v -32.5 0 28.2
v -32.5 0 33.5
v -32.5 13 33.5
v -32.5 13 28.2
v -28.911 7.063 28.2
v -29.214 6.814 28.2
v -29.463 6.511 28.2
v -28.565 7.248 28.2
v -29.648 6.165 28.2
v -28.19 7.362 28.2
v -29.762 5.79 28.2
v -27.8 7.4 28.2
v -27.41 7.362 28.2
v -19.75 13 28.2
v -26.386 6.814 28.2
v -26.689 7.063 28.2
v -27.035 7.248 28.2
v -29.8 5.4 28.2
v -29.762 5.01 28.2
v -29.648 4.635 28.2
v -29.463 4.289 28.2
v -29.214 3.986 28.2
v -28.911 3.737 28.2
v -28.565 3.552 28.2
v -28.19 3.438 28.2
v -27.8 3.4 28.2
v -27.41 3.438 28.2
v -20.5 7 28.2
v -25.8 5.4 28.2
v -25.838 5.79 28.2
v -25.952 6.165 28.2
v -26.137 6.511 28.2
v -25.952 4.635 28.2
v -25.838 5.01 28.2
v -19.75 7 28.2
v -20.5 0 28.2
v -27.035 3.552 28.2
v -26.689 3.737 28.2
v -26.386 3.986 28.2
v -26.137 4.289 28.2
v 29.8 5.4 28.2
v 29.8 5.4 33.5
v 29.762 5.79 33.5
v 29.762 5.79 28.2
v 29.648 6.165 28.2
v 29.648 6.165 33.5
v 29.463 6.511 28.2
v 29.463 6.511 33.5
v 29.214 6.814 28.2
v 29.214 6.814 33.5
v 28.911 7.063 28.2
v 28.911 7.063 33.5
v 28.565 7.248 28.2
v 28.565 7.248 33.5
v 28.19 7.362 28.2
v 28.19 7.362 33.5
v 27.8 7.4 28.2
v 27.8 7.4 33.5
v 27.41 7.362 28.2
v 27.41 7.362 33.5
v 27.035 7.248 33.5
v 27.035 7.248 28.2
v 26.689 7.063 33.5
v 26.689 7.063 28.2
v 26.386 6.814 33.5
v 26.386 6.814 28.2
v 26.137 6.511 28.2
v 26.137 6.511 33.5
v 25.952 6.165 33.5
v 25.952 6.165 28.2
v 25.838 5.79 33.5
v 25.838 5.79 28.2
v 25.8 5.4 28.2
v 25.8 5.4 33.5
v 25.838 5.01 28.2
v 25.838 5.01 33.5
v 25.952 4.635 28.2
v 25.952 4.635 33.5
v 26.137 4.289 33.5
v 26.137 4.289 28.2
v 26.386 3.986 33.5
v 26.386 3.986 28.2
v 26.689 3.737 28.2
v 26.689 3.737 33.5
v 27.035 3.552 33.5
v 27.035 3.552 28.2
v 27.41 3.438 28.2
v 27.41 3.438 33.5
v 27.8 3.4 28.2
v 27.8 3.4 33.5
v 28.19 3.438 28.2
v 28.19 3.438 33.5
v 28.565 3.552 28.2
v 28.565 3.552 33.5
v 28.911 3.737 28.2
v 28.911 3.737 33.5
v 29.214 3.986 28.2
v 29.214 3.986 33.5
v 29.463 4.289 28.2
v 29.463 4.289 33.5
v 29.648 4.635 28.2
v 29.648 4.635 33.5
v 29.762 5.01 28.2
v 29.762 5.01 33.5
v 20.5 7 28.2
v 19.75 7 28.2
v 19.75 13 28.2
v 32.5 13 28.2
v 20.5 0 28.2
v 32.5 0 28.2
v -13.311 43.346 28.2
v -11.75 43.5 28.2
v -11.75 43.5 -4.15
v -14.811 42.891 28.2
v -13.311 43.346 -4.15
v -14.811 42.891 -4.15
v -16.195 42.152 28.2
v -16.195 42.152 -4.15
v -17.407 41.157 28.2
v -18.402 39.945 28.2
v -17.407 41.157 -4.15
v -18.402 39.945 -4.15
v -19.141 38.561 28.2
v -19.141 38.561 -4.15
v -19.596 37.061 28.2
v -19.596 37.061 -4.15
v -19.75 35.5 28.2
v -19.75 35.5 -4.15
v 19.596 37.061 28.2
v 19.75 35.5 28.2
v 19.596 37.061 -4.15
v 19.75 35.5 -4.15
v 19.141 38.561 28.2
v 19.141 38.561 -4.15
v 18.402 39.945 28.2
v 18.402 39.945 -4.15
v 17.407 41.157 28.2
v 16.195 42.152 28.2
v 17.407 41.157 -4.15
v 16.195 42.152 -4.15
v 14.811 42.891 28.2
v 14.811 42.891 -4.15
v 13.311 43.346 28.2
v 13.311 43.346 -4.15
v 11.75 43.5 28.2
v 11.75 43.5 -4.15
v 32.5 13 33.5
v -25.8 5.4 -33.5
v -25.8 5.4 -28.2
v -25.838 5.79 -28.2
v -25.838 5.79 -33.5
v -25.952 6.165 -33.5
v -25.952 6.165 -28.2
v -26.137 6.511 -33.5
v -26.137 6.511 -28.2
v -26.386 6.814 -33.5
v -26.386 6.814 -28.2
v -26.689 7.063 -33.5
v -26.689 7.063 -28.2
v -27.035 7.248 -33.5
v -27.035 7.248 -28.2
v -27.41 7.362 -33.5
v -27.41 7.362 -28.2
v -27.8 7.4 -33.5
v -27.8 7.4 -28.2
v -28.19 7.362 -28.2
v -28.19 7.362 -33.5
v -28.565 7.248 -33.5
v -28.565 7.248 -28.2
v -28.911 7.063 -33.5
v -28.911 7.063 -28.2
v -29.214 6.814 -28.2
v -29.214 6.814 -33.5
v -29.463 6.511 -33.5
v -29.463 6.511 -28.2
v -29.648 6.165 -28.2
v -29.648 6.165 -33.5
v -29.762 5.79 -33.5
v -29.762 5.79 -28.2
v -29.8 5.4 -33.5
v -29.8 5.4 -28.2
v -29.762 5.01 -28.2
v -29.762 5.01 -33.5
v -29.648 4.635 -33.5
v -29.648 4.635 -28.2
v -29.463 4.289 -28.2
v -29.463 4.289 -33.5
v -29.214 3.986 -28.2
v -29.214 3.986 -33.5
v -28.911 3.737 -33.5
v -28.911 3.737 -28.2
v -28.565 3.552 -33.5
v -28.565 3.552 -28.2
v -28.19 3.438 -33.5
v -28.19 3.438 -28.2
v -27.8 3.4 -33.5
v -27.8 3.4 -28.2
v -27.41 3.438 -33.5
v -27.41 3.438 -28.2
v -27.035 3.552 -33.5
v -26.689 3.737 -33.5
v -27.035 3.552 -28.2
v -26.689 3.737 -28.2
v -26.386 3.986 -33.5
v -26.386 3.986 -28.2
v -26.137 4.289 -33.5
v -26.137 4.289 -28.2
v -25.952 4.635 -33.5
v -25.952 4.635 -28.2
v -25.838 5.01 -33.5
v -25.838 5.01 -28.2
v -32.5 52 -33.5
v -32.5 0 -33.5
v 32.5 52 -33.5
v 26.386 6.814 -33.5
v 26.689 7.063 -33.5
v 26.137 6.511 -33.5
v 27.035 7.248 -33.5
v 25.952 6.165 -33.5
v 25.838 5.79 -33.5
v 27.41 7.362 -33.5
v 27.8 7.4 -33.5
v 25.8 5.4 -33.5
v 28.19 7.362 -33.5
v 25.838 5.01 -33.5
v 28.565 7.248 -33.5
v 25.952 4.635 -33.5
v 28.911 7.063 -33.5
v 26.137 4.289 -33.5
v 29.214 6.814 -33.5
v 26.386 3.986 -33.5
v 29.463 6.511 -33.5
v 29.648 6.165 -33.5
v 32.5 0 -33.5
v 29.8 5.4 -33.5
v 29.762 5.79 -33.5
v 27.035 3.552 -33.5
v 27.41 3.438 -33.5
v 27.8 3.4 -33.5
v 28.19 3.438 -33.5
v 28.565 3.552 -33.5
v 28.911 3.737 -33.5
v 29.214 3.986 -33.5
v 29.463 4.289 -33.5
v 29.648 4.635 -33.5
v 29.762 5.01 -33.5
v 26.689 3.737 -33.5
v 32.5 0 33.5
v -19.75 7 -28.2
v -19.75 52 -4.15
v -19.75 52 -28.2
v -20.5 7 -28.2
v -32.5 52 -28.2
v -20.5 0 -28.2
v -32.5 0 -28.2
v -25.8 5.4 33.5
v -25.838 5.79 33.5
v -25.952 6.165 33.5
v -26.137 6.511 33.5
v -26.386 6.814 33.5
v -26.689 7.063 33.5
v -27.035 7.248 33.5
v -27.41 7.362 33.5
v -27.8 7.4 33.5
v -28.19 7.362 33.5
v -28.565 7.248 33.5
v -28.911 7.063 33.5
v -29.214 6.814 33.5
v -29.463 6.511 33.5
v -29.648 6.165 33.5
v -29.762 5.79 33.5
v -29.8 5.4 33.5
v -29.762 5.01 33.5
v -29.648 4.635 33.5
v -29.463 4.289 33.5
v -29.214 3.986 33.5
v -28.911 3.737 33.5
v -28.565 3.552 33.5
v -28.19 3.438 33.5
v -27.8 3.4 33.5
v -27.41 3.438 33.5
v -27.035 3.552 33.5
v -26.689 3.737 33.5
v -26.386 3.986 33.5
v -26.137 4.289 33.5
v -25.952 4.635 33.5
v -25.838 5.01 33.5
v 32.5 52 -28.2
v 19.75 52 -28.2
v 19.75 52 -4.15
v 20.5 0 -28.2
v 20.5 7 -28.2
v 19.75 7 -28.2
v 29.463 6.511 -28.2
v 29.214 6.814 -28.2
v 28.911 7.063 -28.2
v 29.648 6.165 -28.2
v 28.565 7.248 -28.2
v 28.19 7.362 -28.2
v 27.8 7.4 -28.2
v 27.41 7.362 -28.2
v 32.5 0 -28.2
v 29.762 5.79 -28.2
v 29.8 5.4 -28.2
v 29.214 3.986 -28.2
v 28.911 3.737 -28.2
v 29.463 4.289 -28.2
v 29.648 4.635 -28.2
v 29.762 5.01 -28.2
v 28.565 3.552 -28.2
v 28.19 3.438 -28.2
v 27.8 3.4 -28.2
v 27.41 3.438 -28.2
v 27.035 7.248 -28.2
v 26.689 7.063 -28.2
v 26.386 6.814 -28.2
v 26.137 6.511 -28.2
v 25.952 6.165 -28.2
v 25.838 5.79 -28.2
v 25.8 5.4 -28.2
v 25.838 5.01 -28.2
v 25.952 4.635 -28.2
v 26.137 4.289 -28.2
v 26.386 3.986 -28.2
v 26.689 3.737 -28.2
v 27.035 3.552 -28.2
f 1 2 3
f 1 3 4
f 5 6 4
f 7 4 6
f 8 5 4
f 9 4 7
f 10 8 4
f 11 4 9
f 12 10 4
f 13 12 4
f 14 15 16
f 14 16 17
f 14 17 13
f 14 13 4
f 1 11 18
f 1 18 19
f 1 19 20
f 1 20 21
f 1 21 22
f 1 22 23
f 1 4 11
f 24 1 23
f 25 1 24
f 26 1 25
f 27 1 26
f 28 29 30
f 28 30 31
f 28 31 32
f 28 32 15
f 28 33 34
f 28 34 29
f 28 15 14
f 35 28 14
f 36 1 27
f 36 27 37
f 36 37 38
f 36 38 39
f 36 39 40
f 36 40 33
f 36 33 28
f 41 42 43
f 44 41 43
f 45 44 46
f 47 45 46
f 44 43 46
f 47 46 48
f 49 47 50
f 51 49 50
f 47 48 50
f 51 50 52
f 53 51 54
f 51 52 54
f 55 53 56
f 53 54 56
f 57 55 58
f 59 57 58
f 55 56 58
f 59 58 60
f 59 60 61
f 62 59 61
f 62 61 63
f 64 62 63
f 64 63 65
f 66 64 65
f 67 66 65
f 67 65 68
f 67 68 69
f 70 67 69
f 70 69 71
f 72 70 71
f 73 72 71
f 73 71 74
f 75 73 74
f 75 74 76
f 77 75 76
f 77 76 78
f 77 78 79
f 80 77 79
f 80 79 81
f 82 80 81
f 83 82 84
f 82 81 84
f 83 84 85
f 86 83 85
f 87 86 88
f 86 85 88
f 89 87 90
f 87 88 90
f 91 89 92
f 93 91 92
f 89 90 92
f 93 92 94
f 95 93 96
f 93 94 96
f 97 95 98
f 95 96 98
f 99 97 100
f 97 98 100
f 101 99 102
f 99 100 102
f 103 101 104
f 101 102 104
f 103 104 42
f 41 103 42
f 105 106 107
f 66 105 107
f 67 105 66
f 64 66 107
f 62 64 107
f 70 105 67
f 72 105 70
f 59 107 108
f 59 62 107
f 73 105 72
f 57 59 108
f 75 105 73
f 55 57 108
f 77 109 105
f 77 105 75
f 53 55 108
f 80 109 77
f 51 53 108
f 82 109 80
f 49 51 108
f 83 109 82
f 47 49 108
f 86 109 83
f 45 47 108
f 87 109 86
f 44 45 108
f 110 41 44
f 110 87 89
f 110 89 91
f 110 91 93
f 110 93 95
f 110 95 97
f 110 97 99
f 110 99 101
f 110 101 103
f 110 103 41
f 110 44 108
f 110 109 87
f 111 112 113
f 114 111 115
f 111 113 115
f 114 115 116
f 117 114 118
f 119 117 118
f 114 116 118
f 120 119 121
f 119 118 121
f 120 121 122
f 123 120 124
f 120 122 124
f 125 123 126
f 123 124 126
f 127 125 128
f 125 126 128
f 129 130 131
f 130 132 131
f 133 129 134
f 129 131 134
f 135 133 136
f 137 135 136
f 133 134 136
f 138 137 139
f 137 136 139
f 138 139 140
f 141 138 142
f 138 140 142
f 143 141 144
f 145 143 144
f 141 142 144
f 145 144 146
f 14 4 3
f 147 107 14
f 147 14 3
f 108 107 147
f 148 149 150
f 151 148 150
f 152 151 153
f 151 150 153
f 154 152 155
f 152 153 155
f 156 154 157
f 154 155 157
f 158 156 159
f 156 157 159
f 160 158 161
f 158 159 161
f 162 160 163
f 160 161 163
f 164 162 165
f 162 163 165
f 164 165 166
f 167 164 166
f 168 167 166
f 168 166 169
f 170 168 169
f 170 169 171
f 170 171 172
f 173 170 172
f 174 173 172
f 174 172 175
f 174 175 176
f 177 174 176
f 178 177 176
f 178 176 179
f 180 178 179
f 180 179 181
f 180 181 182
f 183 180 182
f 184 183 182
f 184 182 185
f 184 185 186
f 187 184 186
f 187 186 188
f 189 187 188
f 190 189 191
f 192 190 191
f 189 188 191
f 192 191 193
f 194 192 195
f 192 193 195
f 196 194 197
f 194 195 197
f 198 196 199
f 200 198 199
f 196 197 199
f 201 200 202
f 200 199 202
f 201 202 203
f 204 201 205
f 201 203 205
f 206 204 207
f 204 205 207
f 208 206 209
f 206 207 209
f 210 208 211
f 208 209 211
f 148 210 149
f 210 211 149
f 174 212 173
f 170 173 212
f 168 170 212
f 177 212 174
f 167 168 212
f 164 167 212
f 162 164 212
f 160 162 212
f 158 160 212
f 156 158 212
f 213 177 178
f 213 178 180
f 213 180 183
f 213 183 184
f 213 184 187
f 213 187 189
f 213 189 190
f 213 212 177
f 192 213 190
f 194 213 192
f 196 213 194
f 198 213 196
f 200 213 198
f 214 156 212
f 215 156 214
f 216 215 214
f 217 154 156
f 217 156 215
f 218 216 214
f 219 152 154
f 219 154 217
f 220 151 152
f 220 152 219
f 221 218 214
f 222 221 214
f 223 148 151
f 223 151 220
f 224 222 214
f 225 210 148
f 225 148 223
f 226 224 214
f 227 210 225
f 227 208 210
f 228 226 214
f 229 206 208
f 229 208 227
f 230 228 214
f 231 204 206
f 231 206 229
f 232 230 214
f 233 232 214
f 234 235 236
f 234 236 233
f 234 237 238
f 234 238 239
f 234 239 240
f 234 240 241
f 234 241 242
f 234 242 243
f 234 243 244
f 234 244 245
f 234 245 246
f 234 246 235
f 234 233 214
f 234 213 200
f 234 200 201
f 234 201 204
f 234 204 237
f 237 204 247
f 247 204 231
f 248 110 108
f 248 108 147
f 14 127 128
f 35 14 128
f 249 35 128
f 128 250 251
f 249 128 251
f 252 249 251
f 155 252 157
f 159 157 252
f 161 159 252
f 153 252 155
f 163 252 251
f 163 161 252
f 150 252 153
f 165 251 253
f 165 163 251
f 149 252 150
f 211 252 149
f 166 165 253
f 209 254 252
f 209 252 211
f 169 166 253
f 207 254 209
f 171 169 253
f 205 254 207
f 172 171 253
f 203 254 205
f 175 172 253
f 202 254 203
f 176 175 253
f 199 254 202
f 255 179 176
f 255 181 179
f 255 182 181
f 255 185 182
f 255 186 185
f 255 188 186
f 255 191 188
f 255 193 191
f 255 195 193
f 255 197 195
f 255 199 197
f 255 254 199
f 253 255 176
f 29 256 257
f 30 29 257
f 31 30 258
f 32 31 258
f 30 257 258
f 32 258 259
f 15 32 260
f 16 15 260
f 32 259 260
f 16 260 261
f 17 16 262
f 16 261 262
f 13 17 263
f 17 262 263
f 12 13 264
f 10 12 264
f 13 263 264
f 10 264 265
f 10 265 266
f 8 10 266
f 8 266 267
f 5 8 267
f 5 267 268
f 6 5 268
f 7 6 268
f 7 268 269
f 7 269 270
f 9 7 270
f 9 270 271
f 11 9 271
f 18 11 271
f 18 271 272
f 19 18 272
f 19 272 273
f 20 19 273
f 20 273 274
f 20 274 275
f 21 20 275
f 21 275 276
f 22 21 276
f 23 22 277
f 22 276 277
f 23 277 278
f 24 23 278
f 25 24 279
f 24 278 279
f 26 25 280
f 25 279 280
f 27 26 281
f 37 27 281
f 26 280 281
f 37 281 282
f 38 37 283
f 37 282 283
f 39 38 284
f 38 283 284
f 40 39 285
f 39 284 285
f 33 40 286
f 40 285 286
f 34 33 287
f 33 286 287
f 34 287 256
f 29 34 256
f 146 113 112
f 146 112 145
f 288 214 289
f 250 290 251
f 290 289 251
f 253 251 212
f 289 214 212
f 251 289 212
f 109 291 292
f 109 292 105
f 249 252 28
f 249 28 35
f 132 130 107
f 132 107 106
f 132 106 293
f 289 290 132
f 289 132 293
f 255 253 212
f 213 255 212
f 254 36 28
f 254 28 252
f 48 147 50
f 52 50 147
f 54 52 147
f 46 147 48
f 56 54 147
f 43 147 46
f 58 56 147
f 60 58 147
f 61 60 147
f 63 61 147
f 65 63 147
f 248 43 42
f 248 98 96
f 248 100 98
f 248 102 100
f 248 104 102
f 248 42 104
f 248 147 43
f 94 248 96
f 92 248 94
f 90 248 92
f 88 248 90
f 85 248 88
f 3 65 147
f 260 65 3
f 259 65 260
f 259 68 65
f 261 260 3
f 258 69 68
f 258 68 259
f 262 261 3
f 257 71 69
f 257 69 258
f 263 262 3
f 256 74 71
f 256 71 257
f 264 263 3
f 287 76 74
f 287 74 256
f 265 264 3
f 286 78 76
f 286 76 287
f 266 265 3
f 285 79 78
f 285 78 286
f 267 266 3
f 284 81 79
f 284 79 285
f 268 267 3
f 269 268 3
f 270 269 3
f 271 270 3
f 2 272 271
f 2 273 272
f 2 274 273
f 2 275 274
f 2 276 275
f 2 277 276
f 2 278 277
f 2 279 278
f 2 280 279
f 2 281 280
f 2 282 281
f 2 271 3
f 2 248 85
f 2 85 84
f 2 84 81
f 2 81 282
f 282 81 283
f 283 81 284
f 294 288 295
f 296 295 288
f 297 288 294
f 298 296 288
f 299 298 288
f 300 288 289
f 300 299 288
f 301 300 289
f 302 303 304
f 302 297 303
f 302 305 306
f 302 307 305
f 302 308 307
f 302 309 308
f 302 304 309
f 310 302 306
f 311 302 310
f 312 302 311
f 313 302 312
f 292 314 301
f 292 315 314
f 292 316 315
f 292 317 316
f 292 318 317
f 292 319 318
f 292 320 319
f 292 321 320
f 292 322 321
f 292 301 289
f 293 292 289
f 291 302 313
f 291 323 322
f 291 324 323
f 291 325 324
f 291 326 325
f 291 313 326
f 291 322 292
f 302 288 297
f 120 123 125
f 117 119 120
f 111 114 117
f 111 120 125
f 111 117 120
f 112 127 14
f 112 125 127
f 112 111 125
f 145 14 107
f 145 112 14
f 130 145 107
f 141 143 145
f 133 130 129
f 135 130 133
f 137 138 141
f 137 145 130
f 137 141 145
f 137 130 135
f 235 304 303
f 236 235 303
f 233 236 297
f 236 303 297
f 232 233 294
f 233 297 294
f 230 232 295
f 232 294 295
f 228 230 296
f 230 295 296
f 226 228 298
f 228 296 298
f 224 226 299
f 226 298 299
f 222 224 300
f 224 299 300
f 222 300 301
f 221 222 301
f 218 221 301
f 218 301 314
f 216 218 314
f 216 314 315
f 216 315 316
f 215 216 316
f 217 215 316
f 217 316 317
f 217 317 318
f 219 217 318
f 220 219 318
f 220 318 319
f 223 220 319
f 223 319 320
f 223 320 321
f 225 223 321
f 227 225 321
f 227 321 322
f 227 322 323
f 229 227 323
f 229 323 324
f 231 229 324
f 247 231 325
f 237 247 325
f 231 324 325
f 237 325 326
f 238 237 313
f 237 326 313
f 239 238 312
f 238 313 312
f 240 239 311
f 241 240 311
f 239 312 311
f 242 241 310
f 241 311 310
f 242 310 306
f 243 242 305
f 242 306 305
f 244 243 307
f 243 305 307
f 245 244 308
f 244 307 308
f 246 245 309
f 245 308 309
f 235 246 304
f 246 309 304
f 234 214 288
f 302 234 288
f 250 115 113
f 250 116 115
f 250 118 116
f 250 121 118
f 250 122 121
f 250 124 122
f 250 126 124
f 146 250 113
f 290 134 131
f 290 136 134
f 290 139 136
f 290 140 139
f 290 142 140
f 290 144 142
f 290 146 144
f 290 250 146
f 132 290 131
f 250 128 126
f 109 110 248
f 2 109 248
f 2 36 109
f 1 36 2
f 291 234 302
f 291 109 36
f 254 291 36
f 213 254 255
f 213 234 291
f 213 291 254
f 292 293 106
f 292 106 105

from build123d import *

# Parameters (mm, degrees)
RESSALTO_EXTRUS_O1_DEPTH = 52
ESBO_O2_R                = 2
CORTE_EXTRUS_O1_DEPTH    = 100
ESBO_O3_W                = 41
ESBO_O3_H                = 32.35
CORTE_EXTRUS_O2_DEPTH    = 8.5
ESBO_O8_W                = 65
ESBO_O8_H                = 5.3
CORTE_EXTRUS_O6_DEPTH    = 39
ESBO_O9_W                = 0.75
ESBO_O9_H                = 56.4
CORTE_EXTRUS_O7_DEPTH    = 45
FILETE6_R                = 8


with BuildPart() as part:
    # Esboço1 → Ressalto-extrusão1 (new body)
    with BuildSketch(Plane(origin=(0, 0, 0), x_dir=(1, 0, 0), z_dir=(0, 1, 0))):
        Polygon((-32.5, -28.2), (-20.5, -28.2), (-20.5, 28.2), (-32.5, 28.2), (-32.5, 33.5), (32.5, 33.5), (32.5, 28.2), (20.5, 28.2), (20.5, -28.2), (32.5, -28.2), (32.5, -33.5), (-32.5, -33.5), align=None)
    extrude(amount=RESSALTO_EXTRUS_O1_DEPTH)

    # Esboço2 → Corte-extrusão1 (cut)
    with BuildSketch(Plane.XY.offset(33.5)):
        with Locations((27.8, 5.4)):
            Circle(ESBO_O2_R)
        with Locations((-27.8, 5.4)):
            Circle(ESBO_O2_R)
    extrude(amount=-CORTE_EXTRUS_O1_DEPTH, mode=Mode.SUBTRACT)

    # Esboço3 → Corte-extrusão2 (cut)
    with BuildSketch(Plane(origin=(0, 52, 0), x_dir=(1, 0, 0), z_dir=(0, 1, 0))):
        with Locations((0, -12.025)):
            Rectangle(ESBO_O3_W, ESBO_O3_H)
    extrude(amount=-CORTE_EXTRUS_O2_DEPTH, mode=Mode.SUBTRACT)

    # Esboço8 → Corte-extrusão6 (cut)
    with BuildSketch(Plane(origin=(0, 52, 0), x_dir=(1, 0, 0), z_dir=(0, 1, 0))):
        with Locations((0, -30.85)):
            Rectangle(ESBO_O8_W, ESBO_O8_H)
    extrude(amount=-CORTE_EXTRUS_O6_DEPTH, mode=Mode.SUBTRACT)

    # Esboço9 → Corte-extrusão7 (cut)
    with BuildSketch(Plane(origin=(0, 52, 0), x_dir=(1, 0, 0), z_dir=(0, 1, 0))):
        with Locations((-20.125, 0)):
            Rectangle(ESBO_O9_W, ESBO_O9_H)
        with Locations((20.125, 0)):
            Rectangle(ESBO_O9_W, ESBO_O9_H)
    extrude(amount=-CORTE_EXTRUS_O7_DEPTH, mode=Mode.SUBTRACT)

    # Filete6
    filete6_edges = [part.edges().sort_by_distance(p)[0] for p in [
        (19.75, 43.5, 12.025),
        (-19.75, 43.5, 12.025),
    ]]
    fillet(filete6_edges, radius=FILETE6_R)


solid = part.part
